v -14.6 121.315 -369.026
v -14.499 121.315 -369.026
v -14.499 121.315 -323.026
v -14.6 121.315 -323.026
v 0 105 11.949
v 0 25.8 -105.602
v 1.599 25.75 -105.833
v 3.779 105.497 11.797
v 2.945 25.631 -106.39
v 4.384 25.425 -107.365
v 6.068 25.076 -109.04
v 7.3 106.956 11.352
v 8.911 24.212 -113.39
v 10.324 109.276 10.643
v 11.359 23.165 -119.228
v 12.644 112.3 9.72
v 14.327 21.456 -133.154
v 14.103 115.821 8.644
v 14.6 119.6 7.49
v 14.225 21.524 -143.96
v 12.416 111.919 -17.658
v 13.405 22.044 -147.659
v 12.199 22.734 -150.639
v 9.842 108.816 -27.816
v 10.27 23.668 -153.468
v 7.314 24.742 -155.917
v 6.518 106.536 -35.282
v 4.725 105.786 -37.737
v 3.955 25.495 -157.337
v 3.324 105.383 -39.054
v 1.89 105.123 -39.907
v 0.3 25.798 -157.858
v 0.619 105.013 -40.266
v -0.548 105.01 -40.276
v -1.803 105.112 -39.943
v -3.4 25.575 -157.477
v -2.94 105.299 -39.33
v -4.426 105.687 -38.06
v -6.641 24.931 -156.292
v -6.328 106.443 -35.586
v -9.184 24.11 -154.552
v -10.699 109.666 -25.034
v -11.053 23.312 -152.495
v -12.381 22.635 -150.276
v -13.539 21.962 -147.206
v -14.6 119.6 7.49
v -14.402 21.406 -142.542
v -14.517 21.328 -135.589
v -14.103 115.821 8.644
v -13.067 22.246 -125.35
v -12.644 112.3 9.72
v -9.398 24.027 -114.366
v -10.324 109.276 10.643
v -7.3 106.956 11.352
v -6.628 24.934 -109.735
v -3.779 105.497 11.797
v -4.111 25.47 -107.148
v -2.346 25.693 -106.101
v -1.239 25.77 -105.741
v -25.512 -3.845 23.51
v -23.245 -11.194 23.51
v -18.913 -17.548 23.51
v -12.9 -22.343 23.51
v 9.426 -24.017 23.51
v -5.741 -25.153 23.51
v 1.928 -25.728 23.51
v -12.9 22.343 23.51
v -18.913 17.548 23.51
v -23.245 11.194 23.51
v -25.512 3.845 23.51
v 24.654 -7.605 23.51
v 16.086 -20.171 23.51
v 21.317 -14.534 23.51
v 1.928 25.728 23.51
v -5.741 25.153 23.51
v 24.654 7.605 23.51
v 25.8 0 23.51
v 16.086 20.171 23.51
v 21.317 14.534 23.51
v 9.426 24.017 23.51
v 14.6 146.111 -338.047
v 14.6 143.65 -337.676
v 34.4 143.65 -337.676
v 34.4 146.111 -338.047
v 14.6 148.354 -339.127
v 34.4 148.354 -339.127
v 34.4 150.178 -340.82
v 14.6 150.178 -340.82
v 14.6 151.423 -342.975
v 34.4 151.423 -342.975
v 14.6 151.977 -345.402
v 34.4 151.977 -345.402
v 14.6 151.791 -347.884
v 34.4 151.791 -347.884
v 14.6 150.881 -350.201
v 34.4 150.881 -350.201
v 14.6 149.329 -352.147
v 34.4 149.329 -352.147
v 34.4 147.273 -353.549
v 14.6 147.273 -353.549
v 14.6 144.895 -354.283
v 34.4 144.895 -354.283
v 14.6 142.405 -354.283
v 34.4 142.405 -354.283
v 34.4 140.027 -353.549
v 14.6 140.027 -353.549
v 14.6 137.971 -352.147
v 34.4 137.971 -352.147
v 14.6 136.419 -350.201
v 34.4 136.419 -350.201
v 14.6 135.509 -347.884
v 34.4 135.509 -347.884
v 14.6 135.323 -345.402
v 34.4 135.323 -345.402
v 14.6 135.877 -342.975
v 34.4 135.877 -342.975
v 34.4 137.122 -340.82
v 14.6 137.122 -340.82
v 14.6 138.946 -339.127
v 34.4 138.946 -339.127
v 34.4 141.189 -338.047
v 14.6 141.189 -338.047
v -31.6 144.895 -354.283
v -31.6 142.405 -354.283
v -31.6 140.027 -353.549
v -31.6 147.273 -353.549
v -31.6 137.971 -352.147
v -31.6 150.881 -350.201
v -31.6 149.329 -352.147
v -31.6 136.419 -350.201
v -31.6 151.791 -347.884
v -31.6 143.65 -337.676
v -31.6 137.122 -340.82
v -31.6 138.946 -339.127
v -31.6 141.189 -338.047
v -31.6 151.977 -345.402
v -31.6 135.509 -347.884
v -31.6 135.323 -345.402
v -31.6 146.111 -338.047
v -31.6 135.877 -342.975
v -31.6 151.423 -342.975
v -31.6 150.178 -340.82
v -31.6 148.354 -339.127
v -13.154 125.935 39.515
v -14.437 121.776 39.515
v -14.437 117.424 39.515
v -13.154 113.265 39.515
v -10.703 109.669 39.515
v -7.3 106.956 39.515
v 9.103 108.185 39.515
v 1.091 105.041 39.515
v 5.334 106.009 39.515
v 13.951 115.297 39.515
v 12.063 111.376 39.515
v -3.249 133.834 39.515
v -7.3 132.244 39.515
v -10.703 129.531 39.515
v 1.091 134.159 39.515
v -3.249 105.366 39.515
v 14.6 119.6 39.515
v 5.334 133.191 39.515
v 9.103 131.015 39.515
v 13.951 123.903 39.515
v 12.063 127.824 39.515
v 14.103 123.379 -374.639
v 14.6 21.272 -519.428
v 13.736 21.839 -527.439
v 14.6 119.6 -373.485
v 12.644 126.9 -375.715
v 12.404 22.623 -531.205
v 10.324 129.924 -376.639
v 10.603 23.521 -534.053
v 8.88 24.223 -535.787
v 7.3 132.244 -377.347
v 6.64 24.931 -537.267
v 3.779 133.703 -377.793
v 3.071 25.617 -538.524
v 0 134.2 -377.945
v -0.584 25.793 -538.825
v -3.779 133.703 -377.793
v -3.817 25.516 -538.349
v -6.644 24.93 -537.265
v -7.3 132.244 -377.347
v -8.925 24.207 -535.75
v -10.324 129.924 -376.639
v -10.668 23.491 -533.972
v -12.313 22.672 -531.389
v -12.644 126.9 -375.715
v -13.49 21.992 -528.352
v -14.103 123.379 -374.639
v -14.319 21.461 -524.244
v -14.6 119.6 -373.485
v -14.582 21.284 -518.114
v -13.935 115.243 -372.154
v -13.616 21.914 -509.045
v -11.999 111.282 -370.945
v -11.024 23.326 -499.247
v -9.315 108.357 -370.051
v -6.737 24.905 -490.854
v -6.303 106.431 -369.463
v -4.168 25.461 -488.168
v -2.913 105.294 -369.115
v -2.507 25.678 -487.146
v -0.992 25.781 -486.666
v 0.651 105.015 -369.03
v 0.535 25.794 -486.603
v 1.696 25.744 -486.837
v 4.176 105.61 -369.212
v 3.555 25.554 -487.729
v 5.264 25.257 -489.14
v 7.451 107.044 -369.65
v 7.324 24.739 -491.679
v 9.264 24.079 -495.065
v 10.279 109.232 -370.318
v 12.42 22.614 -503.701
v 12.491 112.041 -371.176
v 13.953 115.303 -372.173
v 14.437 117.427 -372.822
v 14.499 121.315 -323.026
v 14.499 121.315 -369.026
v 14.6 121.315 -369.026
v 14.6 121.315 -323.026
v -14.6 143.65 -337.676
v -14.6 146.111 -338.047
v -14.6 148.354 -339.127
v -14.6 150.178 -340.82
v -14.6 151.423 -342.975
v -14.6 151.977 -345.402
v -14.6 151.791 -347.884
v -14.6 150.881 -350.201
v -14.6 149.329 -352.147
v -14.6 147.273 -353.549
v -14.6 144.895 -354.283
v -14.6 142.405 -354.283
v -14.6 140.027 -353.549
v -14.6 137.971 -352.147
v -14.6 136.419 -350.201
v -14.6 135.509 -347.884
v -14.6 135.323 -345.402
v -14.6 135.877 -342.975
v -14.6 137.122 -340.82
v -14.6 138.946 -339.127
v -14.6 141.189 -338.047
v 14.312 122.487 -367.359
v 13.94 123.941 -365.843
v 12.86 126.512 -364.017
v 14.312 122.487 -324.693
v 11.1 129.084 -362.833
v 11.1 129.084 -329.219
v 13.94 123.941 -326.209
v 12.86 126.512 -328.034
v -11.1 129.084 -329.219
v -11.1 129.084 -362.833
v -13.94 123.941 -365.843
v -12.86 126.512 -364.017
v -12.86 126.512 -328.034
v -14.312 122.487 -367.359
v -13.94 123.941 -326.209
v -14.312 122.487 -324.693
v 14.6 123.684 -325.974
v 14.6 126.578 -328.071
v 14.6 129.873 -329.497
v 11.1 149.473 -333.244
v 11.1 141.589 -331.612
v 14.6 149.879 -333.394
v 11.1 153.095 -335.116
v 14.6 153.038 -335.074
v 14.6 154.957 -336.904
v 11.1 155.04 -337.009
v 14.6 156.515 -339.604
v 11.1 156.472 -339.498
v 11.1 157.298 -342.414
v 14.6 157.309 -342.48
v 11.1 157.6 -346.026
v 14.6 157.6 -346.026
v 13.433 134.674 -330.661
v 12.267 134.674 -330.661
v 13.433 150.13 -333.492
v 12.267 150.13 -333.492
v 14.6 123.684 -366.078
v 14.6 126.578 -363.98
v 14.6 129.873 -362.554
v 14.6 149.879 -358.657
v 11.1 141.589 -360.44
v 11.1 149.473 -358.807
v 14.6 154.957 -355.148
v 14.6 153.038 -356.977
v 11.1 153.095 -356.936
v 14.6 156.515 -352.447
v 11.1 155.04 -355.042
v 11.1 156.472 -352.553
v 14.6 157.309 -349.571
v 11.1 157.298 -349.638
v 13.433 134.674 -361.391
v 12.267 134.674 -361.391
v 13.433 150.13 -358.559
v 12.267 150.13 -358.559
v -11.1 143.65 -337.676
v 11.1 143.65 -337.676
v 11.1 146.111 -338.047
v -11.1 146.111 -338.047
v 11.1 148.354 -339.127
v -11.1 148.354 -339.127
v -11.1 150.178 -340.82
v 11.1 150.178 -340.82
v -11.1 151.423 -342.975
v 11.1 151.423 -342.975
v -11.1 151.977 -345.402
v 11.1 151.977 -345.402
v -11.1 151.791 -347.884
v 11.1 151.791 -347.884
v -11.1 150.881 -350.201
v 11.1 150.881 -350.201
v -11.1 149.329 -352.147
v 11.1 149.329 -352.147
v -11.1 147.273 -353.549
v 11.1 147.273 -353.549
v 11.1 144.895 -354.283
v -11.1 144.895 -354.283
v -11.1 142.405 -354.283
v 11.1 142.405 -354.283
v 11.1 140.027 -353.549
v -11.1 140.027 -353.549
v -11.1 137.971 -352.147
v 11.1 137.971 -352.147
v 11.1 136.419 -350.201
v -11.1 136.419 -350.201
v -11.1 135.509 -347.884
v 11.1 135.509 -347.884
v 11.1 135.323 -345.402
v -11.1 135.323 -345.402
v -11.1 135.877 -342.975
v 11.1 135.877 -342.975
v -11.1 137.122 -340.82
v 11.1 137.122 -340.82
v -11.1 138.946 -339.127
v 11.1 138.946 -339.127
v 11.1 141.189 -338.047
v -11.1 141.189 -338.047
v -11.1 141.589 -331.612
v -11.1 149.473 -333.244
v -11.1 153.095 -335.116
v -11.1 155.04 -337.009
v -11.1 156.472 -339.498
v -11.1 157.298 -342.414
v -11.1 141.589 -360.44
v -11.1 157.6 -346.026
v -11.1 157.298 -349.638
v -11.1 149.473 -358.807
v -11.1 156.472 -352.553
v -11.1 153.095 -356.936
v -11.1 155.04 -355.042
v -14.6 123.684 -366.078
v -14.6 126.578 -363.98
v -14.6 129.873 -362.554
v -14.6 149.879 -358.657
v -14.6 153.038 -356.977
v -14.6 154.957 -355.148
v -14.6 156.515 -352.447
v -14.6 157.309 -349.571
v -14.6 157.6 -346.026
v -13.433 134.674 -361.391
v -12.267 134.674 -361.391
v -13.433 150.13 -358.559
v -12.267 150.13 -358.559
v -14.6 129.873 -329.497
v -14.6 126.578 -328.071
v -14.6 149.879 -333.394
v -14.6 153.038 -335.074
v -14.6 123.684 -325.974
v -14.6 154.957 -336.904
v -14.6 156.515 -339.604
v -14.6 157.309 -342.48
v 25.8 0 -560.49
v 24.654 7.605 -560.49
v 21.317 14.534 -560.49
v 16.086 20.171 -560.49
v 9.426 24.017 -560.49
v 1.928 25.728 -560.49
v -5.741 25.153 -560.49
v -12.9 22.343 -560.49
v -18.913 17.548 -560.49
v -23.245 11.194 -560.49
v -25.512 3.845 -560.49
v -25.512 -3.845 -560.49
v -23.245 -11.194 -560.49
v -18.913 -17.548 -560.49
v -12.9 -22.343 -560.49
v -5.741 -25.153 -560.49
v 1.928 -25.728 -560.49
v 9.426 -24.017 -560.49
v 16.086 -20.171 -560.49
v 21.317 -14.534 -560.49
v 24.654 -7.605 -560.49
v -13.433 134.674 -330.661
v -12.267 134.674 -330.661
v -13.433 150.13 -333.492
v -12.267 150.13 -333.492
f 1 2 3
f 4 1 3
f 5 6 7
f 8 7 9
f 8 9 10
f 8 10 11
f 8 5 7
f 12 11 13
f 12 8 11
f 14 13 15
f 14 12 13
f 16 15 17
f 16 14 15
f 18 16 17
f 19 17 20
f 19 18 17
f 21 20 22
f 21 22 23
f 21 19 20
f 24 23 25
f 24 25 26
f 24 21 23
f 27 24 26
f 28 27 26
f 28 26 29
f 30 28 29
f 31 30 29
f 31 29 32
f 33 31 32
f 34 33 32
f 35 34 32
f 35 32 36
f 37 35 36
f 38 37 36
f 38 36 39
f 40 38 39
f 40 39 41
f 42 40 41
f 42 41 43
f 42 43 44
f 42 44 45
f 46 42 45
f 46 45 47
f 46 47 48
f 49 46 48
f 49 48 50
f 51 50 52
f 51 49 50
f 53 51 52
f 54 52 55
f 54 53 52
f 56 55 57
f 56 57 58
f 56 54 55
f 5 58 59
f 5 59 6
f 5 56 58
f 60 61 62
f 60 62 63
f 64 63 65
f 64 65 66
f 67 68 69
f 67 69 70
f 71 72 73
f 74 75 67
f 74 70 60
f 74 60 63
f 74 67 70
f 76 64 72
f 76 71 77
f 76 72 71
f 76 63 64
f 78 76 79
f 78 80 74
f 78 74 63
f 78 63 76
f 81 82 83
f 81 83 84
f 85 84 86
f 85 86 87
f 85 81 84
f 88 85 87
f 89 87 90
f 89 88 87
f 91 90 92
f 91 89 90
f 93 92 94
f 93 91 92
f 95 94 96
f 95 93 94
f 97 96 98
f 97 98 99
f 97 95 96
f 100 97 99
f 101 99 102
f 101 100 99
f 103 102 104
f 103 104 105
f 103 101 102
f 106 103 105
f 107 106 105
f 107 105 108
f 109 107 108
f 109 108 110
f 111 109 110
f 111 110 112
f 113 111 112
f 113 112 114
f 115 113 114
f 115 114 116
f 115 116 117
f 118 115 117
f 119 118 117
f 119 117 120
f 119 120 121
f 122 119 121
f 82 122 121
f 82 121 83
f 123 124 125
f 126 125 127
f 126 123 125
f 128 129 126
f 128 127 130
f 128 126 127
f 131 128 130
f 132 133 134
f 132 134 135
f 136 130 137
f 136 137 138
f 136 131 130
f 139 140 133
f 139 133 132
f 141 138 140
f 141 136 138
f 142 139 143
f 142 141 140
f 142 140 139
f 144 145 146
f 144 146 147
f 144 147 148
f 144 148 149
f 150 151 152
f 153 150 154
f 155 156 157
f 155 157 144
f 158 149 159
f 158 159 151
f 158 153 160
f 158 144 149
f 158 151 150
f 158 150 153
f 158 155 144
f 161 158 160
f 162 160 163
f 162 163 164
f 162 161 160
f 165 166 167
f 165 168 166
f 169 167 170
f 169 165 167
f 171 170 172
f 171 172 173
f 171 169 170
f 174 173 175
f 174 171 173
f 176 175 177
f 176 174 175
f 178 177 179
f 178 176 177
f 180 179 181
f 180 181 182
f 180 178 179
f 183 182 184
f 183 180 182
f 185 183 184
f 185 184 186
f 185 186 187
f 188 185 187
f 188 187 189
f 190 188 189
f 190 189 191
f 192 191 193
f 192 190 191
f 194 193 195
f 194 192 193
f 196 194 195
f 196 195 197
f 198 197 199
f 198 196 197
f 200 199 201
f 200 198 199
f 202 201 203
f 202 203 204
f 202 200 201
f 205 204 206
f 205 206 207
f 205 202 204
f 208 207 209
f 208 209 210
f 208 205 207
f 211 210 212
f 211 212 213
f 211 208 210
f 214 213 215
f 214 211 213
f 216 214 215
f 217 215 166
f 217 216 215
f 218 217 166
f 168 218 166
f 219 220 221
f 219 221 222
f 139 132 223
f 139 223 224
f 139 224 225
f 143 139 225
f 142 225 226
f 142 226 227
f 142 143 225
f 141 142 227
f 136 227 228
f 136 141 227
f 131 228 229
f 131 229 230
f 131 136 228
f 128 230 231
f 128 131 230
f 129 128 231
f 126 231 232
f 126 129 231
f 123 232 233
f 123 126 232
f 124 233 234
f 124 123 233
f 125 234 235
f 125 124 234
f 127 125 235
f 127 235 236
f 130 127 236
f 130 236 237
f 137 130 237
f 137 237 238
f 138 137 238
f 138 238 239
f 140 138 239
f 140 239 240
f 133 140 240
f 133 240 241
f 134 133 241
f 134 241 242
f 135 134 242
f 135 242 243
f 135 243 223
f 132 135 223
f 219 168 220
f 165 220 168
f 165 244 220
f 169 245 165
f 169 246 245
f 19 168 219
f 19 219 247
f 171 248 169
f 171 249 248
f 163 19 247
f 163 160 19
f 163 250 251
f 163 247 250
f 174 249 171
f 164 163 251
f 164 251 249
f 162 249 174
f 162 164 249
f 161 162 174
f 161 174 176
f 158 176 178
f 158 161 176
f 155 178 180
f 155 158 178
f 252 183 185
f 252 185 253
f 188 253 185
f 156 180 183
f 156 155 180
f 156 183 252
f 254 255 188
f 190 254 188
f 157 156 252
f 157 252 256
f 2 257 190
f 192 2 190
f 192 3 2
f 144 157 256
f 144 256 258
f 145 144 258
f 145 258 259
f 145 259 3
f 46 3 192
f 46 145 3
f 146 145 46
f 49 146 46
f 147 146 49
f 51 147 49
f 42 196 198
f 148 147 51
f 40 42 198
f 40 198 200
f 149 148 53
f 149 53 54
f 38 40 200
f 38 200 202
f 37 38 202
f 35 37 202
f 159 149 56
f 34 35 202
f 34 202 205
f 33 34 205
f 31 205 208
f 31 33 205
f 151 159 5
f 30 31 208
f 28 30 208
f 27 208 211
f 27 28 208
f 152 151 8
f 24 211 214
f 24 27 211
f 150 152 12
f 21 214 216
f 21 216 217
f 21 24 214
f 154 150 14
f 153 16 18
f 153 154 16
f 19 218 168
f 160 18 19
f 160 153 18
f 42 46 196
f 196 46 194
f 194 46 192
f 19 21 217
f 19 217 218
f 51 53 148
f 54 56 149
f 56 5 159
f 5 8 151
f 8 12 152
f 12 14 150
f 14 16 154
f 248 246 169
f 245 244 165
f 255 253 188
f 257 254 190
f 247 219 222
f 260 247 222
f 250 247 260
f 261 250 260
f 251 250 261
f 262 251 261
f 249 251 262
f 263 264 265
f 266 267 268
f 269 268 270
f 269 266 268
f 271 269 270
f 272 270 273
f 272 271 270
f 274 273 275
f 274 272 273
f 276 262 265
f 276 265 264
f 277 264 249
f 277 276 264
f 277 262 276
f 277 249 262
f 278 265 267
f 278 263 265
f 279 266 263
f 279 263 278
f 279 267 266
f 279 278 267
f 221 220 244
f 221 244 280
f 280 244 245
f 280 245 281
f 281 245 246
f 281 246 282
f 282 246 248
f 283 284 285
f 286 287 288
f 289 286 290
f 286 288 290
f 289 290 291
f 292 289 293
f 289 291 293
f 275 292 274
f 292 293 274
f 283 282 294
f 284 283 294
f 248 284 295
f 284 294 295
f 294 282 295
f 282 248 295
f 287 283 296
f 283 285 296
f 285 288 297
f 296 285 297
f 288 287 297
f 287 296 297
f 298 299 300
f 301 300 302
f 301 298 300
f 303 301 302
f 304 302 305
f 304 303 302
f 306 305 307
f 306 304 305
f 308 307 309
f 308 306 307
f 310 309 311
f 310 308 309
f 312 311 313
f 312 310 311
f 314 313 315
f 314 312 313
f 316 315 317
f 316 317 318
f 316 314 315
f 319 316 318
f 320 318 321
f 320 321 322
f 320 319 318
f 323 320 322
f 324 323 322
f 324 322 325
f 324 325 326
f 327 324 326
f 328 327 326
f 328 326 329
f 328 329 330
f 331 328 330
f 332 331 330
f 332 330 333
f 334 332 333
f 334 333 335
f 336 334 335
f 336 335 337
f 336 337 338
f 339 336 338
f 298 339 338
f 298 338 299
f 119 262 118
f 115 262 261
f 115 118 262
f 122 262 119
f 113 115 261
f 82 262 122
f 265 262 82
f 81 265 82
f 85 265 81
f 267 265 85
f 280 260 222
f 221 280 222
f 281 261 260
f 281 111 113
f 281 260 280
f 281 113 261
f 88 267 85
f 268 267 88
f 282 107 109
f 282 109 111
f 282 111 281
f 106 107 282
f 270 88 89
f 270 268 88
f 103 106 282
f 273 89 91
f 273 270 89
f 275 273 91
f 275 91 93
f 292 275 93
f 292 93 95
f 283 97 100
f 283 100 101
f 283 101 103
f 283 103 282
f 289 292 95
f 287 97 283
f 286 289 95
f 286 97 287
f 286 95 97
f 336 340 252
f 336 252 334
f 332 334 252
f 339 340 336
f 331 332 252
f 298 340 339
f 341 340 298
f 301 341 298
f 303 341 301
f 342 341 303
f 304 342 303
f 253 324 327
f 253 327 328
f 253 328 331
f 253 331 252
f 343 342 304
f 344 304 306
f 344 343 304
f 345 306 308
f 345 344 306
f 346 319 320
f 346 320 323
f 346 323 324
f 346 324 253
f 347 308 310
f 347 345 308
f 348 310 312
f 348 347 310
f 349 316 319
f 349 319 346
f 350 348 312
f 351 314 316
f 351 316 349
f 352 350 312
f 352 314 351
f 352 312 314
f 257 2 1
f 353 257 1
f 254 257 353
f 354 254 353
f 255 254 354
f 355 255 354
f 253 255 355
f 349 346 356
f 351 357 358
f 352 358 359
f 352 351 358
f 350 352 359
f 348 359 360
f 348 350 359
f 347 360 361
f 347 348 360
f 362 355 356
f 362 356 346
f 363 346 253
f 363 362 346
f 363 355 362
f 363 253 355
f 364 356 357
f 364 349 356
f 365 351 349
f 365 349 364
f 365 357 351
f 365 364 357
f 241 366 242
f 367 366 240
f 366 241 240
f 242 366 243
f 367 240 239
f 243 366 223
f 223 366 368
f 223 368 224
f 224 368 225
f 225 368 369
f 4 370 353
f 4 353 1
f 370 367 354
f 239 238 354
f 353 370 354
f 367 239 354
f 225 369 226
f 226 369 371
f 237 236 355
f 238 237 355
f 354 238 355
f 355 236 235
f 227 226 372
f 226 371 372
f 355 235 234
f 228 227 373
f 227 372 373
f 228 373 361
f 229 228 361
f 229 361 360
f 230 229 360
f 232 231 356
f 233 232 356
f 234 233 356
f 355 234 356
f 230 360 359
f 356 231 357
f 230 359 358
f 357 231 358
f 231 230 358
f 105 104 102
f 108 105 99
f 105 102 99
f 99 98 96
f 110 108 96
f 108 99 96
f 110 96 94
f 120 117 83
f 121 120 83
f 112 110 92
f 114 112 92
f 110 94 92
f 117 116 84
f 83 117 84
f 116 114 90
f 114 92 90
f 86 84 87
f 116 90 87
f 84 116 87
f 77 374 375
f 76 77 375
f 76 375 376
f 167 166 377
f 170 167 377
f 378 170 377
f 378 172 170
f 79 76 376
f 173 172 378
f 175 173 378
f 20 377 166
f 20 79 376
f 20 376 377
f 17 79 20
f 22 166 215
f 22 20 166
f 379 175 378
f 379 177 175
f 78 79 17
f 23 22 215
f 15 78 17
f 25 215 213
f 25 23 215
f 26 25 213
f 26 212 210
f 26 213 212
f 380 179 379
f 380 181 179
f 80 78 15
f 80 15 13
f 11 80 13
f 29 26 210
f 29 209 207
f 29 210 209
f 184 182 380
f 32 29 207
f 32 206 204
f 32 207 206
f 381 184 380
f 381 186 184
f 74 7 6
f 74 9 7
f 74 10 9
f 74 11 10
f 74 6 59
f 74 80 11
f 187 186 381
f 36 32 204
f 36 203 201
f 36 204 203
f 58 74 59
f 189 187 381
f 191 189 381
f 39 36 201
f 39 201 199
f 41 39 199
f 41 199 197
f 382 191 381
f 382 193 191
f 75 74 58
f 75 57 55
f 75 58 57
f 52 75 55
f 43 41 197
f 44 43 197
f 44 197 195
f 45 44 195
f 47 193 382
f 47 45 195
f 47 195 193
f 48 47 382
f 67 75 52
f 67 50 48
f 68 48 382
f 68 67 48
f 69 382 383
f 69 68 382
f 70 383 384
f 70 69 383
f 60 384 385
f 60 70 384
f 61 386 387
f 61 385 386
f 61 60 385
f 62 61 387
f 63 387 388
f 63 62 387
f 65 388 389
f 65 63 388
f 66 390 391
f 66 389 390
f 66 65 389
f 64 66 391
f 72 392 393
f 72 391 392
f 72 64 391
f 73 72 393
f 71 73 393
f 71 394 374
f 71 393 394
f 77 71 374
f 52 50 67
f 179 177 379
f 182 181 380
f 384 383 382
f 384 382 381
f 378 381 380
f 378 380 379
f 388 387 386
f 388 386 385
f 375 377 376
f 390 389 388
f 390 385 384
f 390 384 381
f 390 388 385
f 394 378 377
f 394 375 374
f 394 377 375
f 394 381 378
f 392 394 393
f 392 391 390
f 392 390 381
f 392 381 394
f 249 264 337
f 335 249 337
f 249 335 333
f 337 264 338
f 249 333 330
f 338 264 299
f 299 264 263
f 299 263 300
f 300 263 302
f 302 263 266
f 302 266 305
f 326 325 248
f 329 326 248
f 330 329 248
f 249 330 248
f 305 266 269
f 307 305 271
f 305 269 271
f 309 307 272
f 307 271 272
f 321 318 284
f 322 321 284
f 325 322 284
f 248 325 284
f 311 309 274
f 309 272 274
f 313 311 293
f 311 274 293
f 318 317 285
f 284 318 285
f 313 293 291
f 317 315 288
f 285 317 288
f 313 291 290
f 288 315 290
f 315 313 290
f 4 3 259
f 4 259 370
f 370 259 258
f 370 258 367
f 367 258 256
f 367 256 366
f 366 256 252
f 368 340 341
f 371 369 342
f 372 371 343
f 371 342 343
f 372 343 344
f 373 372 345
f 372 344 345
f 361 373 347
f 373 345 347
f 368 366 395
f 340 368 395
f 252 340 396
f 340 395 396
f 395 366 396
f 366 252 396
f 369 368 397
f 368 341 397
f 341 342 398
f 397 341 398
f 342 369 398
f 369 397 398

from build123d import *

# Parameters (mm, degrees)
SKETCH1_R                = 25.8
BOSS_EXTRUDE1_DEPTH      = 544
SKETCH6_R                = 14.6
BOSS_EXTRUDE2_REACH      = 541.822
BOSS_EXTRUDE2_END_RADIUS = 25.8
SKETCH4_R                = 14.6
BOSS_EXTRUDE3_START      = -3.5
BOSS_EXTRUDE3_OUTLINE_R  = 8.35
BOSS_EXTRUDE3_DEPTH      = 3.5
BOSS_EXTRUDE4_START      = 17
SKETCH7_3_R              = 8.35
BOSS_EXTRUDE4_DEPTH      = 66
SKETCH9_R                = 25.8
BOSS_EXTRUDE5_DEPTH      = 16.49
BOSS_EXTRUDE6_START      = 23.51
SKETCH10_R               = 25.8
BOSS_EXTRUDE6_DEPTH      = 23.51
BOSS_EXTRUDE7_START      = 13
SKETCH11_R               = 14.6
BOSS_EXTRUDE7_DEPTH      = 13


# Read off the part's stored shape, not the designer's step: Boss-Extrude3
with BuildPart() as part:
    # Sketch1 → Boss-Extrude1 (new body)
    with BuildSketch(Plane.XY):
        Circle(SKETCH1_R)
    extrude(amount=-BOSS_EXTRUDE1_DEPTH)

    # Sweep2: sweep along a path in Sketch2
    with BuildLine(Plane(origin=(0, 0, 0), x_dir=(0, 0, -1), z_dir=(1, 0, 0))) as sweep2_path:
        Line((535.242725219, 10.616416132), (373.485286901, 119.6))
        Line((373.485286901, 119.6), (-26.514713099, 119.6))
    # Sketch6 → Sweep2 (sweep)
    with BuildSketch(Plane(origin=(0, 10.616416132, -535.242725219), x_dir=(1, 0, 0), z_dir=(0, 0.5587587437797145, 0.8293302516185669))):
        Circle(SKETCH6_R)
    sweep(path=sweep2_path.line, transition=Transition.RIGHT)

    # Boss-Extrude2: up to this cylinder (the profile starts outside it)
    boss_extrude2_end = Plane(origin=(0, 0, 7.489761), z_dir=(0, 0, 1)) * Cylinder(BOSS_EXTRUDE2_END_RADIUS, 1136.244, mode=Mode.PRIVATE)
    # Sketch4 → Boss-Extrude2 (add, up to the surface)
    with BuildSketch(Plane(origin=(0, 296.142134203, -111.454966642), x_dir=(1, 0, 0), z_dir=(0, 0.5587587437797145, 0.8293302516185669)), mode=Mode.PRIVATE) as boss_extrude2_sk1:
        with Locations(Location((0, -212.87313933, 0), (0, 0, 270))):
            Circle(SKETCH4_R)
    boss_extrude2_tool1 = extrude(boss_extrude2_sk1.sketch, amount=-BOSS_EXTRUDE2_REACH, mode=Mode.PRIVATE) - boss_extrude2_end
    add(boss_extrude2_tool1.solids().sort_by_distance((0, 119.6, 7.489761))[0])

    # Boss-Extrude3 outline → Boss-Extrude3 (add)
    with BuildSketch(Plane.ZY.offset(14.6).offset(BOSS_EXTRUDE3_START)):
        with BuildLine():
            add(Edge.make_bspline(
                [(-369.025798161, 121.314868638), (-354.153662916, 130.263805611), (-368.24558028, 157.483504956), (-346.0257981, 157.599948143)],
                knots=[0, 0, 0, 0, 0.999846057, 0.999846057, 0.999846057, 0.999846057], degree=3))
            Line((-369.025798161, 121.314868638), (-323.025798161, 121.314868638))
            add(Edge.make_bspline(
                [(-323.025798161, 121.314868638), (-337.897933379, 130.263805595), (-323.806016093, 157.483504857), (-346.0257981, 157.599948143)],
                knots=[0, 0, 0, 0, 0.999846056, 0.999846056, 0.999846056, 0.999846056], degree=3))
        make_face()
        with Locations((-346.025798161, 143.65)):
            Circle(BOSS_EXTRUDE3_OUTLINE_R, mode=Mode.SUBTRACT)
    boss_extrude3 = extrude(amount=BOSS_EXTRUDE3_DEPTH)

    # Mirror1: Boss-Extrude3 across plane
    add(boss_extrude3.mirror(Plane.ZY))

    # Sketch7<3> → Boss-Extrude4 (add)
    with BuildSketch(Plane.ZY.offset(14.6).offset(BOSS_EXTRUDE4_START)):
        with Locations((-346.025798161, 143.65)):
            Circle(SKETCH7_3_R)
    extrude(amount=-BOSS_EXTRUDE4_DEPTH)

    # Sketch9 → Boss-Extrude5 (add)
    with BuildSketch(Plane(origin=(0, 0, -544), x_dir=(-1, 0, 0), z_dir=(0, 0, -1))):
        with Locations(Location((0, 0, 0), (0, 0, 180))):
            Circle(SKETCH9_R)
    extrude(amount=BOSS_EXTRUDE5_DEPTH)

    # Sketch10 → Boss-Extrude6 (add)
    with BuildSketch(Plane.XY.offset(BOSS_EXTRUDE6_START)):
        Circle(SKETCH10_R)
    extrude(amount=-BOSS_EXTRUDE6_DEPTH)

    # Sketch11 → Boss-Extrude7 (add)
    with BuildSketch(Plane.XY.offset(26.514713099).offset(BOSS_EXTRUDE7_START)):
        with Locations((0, 119.6)):
            Circle(SKETCH11_R)
    extrude(amount=-BOSS_EXTRUDE7_DEPTH)


solid = part.part
